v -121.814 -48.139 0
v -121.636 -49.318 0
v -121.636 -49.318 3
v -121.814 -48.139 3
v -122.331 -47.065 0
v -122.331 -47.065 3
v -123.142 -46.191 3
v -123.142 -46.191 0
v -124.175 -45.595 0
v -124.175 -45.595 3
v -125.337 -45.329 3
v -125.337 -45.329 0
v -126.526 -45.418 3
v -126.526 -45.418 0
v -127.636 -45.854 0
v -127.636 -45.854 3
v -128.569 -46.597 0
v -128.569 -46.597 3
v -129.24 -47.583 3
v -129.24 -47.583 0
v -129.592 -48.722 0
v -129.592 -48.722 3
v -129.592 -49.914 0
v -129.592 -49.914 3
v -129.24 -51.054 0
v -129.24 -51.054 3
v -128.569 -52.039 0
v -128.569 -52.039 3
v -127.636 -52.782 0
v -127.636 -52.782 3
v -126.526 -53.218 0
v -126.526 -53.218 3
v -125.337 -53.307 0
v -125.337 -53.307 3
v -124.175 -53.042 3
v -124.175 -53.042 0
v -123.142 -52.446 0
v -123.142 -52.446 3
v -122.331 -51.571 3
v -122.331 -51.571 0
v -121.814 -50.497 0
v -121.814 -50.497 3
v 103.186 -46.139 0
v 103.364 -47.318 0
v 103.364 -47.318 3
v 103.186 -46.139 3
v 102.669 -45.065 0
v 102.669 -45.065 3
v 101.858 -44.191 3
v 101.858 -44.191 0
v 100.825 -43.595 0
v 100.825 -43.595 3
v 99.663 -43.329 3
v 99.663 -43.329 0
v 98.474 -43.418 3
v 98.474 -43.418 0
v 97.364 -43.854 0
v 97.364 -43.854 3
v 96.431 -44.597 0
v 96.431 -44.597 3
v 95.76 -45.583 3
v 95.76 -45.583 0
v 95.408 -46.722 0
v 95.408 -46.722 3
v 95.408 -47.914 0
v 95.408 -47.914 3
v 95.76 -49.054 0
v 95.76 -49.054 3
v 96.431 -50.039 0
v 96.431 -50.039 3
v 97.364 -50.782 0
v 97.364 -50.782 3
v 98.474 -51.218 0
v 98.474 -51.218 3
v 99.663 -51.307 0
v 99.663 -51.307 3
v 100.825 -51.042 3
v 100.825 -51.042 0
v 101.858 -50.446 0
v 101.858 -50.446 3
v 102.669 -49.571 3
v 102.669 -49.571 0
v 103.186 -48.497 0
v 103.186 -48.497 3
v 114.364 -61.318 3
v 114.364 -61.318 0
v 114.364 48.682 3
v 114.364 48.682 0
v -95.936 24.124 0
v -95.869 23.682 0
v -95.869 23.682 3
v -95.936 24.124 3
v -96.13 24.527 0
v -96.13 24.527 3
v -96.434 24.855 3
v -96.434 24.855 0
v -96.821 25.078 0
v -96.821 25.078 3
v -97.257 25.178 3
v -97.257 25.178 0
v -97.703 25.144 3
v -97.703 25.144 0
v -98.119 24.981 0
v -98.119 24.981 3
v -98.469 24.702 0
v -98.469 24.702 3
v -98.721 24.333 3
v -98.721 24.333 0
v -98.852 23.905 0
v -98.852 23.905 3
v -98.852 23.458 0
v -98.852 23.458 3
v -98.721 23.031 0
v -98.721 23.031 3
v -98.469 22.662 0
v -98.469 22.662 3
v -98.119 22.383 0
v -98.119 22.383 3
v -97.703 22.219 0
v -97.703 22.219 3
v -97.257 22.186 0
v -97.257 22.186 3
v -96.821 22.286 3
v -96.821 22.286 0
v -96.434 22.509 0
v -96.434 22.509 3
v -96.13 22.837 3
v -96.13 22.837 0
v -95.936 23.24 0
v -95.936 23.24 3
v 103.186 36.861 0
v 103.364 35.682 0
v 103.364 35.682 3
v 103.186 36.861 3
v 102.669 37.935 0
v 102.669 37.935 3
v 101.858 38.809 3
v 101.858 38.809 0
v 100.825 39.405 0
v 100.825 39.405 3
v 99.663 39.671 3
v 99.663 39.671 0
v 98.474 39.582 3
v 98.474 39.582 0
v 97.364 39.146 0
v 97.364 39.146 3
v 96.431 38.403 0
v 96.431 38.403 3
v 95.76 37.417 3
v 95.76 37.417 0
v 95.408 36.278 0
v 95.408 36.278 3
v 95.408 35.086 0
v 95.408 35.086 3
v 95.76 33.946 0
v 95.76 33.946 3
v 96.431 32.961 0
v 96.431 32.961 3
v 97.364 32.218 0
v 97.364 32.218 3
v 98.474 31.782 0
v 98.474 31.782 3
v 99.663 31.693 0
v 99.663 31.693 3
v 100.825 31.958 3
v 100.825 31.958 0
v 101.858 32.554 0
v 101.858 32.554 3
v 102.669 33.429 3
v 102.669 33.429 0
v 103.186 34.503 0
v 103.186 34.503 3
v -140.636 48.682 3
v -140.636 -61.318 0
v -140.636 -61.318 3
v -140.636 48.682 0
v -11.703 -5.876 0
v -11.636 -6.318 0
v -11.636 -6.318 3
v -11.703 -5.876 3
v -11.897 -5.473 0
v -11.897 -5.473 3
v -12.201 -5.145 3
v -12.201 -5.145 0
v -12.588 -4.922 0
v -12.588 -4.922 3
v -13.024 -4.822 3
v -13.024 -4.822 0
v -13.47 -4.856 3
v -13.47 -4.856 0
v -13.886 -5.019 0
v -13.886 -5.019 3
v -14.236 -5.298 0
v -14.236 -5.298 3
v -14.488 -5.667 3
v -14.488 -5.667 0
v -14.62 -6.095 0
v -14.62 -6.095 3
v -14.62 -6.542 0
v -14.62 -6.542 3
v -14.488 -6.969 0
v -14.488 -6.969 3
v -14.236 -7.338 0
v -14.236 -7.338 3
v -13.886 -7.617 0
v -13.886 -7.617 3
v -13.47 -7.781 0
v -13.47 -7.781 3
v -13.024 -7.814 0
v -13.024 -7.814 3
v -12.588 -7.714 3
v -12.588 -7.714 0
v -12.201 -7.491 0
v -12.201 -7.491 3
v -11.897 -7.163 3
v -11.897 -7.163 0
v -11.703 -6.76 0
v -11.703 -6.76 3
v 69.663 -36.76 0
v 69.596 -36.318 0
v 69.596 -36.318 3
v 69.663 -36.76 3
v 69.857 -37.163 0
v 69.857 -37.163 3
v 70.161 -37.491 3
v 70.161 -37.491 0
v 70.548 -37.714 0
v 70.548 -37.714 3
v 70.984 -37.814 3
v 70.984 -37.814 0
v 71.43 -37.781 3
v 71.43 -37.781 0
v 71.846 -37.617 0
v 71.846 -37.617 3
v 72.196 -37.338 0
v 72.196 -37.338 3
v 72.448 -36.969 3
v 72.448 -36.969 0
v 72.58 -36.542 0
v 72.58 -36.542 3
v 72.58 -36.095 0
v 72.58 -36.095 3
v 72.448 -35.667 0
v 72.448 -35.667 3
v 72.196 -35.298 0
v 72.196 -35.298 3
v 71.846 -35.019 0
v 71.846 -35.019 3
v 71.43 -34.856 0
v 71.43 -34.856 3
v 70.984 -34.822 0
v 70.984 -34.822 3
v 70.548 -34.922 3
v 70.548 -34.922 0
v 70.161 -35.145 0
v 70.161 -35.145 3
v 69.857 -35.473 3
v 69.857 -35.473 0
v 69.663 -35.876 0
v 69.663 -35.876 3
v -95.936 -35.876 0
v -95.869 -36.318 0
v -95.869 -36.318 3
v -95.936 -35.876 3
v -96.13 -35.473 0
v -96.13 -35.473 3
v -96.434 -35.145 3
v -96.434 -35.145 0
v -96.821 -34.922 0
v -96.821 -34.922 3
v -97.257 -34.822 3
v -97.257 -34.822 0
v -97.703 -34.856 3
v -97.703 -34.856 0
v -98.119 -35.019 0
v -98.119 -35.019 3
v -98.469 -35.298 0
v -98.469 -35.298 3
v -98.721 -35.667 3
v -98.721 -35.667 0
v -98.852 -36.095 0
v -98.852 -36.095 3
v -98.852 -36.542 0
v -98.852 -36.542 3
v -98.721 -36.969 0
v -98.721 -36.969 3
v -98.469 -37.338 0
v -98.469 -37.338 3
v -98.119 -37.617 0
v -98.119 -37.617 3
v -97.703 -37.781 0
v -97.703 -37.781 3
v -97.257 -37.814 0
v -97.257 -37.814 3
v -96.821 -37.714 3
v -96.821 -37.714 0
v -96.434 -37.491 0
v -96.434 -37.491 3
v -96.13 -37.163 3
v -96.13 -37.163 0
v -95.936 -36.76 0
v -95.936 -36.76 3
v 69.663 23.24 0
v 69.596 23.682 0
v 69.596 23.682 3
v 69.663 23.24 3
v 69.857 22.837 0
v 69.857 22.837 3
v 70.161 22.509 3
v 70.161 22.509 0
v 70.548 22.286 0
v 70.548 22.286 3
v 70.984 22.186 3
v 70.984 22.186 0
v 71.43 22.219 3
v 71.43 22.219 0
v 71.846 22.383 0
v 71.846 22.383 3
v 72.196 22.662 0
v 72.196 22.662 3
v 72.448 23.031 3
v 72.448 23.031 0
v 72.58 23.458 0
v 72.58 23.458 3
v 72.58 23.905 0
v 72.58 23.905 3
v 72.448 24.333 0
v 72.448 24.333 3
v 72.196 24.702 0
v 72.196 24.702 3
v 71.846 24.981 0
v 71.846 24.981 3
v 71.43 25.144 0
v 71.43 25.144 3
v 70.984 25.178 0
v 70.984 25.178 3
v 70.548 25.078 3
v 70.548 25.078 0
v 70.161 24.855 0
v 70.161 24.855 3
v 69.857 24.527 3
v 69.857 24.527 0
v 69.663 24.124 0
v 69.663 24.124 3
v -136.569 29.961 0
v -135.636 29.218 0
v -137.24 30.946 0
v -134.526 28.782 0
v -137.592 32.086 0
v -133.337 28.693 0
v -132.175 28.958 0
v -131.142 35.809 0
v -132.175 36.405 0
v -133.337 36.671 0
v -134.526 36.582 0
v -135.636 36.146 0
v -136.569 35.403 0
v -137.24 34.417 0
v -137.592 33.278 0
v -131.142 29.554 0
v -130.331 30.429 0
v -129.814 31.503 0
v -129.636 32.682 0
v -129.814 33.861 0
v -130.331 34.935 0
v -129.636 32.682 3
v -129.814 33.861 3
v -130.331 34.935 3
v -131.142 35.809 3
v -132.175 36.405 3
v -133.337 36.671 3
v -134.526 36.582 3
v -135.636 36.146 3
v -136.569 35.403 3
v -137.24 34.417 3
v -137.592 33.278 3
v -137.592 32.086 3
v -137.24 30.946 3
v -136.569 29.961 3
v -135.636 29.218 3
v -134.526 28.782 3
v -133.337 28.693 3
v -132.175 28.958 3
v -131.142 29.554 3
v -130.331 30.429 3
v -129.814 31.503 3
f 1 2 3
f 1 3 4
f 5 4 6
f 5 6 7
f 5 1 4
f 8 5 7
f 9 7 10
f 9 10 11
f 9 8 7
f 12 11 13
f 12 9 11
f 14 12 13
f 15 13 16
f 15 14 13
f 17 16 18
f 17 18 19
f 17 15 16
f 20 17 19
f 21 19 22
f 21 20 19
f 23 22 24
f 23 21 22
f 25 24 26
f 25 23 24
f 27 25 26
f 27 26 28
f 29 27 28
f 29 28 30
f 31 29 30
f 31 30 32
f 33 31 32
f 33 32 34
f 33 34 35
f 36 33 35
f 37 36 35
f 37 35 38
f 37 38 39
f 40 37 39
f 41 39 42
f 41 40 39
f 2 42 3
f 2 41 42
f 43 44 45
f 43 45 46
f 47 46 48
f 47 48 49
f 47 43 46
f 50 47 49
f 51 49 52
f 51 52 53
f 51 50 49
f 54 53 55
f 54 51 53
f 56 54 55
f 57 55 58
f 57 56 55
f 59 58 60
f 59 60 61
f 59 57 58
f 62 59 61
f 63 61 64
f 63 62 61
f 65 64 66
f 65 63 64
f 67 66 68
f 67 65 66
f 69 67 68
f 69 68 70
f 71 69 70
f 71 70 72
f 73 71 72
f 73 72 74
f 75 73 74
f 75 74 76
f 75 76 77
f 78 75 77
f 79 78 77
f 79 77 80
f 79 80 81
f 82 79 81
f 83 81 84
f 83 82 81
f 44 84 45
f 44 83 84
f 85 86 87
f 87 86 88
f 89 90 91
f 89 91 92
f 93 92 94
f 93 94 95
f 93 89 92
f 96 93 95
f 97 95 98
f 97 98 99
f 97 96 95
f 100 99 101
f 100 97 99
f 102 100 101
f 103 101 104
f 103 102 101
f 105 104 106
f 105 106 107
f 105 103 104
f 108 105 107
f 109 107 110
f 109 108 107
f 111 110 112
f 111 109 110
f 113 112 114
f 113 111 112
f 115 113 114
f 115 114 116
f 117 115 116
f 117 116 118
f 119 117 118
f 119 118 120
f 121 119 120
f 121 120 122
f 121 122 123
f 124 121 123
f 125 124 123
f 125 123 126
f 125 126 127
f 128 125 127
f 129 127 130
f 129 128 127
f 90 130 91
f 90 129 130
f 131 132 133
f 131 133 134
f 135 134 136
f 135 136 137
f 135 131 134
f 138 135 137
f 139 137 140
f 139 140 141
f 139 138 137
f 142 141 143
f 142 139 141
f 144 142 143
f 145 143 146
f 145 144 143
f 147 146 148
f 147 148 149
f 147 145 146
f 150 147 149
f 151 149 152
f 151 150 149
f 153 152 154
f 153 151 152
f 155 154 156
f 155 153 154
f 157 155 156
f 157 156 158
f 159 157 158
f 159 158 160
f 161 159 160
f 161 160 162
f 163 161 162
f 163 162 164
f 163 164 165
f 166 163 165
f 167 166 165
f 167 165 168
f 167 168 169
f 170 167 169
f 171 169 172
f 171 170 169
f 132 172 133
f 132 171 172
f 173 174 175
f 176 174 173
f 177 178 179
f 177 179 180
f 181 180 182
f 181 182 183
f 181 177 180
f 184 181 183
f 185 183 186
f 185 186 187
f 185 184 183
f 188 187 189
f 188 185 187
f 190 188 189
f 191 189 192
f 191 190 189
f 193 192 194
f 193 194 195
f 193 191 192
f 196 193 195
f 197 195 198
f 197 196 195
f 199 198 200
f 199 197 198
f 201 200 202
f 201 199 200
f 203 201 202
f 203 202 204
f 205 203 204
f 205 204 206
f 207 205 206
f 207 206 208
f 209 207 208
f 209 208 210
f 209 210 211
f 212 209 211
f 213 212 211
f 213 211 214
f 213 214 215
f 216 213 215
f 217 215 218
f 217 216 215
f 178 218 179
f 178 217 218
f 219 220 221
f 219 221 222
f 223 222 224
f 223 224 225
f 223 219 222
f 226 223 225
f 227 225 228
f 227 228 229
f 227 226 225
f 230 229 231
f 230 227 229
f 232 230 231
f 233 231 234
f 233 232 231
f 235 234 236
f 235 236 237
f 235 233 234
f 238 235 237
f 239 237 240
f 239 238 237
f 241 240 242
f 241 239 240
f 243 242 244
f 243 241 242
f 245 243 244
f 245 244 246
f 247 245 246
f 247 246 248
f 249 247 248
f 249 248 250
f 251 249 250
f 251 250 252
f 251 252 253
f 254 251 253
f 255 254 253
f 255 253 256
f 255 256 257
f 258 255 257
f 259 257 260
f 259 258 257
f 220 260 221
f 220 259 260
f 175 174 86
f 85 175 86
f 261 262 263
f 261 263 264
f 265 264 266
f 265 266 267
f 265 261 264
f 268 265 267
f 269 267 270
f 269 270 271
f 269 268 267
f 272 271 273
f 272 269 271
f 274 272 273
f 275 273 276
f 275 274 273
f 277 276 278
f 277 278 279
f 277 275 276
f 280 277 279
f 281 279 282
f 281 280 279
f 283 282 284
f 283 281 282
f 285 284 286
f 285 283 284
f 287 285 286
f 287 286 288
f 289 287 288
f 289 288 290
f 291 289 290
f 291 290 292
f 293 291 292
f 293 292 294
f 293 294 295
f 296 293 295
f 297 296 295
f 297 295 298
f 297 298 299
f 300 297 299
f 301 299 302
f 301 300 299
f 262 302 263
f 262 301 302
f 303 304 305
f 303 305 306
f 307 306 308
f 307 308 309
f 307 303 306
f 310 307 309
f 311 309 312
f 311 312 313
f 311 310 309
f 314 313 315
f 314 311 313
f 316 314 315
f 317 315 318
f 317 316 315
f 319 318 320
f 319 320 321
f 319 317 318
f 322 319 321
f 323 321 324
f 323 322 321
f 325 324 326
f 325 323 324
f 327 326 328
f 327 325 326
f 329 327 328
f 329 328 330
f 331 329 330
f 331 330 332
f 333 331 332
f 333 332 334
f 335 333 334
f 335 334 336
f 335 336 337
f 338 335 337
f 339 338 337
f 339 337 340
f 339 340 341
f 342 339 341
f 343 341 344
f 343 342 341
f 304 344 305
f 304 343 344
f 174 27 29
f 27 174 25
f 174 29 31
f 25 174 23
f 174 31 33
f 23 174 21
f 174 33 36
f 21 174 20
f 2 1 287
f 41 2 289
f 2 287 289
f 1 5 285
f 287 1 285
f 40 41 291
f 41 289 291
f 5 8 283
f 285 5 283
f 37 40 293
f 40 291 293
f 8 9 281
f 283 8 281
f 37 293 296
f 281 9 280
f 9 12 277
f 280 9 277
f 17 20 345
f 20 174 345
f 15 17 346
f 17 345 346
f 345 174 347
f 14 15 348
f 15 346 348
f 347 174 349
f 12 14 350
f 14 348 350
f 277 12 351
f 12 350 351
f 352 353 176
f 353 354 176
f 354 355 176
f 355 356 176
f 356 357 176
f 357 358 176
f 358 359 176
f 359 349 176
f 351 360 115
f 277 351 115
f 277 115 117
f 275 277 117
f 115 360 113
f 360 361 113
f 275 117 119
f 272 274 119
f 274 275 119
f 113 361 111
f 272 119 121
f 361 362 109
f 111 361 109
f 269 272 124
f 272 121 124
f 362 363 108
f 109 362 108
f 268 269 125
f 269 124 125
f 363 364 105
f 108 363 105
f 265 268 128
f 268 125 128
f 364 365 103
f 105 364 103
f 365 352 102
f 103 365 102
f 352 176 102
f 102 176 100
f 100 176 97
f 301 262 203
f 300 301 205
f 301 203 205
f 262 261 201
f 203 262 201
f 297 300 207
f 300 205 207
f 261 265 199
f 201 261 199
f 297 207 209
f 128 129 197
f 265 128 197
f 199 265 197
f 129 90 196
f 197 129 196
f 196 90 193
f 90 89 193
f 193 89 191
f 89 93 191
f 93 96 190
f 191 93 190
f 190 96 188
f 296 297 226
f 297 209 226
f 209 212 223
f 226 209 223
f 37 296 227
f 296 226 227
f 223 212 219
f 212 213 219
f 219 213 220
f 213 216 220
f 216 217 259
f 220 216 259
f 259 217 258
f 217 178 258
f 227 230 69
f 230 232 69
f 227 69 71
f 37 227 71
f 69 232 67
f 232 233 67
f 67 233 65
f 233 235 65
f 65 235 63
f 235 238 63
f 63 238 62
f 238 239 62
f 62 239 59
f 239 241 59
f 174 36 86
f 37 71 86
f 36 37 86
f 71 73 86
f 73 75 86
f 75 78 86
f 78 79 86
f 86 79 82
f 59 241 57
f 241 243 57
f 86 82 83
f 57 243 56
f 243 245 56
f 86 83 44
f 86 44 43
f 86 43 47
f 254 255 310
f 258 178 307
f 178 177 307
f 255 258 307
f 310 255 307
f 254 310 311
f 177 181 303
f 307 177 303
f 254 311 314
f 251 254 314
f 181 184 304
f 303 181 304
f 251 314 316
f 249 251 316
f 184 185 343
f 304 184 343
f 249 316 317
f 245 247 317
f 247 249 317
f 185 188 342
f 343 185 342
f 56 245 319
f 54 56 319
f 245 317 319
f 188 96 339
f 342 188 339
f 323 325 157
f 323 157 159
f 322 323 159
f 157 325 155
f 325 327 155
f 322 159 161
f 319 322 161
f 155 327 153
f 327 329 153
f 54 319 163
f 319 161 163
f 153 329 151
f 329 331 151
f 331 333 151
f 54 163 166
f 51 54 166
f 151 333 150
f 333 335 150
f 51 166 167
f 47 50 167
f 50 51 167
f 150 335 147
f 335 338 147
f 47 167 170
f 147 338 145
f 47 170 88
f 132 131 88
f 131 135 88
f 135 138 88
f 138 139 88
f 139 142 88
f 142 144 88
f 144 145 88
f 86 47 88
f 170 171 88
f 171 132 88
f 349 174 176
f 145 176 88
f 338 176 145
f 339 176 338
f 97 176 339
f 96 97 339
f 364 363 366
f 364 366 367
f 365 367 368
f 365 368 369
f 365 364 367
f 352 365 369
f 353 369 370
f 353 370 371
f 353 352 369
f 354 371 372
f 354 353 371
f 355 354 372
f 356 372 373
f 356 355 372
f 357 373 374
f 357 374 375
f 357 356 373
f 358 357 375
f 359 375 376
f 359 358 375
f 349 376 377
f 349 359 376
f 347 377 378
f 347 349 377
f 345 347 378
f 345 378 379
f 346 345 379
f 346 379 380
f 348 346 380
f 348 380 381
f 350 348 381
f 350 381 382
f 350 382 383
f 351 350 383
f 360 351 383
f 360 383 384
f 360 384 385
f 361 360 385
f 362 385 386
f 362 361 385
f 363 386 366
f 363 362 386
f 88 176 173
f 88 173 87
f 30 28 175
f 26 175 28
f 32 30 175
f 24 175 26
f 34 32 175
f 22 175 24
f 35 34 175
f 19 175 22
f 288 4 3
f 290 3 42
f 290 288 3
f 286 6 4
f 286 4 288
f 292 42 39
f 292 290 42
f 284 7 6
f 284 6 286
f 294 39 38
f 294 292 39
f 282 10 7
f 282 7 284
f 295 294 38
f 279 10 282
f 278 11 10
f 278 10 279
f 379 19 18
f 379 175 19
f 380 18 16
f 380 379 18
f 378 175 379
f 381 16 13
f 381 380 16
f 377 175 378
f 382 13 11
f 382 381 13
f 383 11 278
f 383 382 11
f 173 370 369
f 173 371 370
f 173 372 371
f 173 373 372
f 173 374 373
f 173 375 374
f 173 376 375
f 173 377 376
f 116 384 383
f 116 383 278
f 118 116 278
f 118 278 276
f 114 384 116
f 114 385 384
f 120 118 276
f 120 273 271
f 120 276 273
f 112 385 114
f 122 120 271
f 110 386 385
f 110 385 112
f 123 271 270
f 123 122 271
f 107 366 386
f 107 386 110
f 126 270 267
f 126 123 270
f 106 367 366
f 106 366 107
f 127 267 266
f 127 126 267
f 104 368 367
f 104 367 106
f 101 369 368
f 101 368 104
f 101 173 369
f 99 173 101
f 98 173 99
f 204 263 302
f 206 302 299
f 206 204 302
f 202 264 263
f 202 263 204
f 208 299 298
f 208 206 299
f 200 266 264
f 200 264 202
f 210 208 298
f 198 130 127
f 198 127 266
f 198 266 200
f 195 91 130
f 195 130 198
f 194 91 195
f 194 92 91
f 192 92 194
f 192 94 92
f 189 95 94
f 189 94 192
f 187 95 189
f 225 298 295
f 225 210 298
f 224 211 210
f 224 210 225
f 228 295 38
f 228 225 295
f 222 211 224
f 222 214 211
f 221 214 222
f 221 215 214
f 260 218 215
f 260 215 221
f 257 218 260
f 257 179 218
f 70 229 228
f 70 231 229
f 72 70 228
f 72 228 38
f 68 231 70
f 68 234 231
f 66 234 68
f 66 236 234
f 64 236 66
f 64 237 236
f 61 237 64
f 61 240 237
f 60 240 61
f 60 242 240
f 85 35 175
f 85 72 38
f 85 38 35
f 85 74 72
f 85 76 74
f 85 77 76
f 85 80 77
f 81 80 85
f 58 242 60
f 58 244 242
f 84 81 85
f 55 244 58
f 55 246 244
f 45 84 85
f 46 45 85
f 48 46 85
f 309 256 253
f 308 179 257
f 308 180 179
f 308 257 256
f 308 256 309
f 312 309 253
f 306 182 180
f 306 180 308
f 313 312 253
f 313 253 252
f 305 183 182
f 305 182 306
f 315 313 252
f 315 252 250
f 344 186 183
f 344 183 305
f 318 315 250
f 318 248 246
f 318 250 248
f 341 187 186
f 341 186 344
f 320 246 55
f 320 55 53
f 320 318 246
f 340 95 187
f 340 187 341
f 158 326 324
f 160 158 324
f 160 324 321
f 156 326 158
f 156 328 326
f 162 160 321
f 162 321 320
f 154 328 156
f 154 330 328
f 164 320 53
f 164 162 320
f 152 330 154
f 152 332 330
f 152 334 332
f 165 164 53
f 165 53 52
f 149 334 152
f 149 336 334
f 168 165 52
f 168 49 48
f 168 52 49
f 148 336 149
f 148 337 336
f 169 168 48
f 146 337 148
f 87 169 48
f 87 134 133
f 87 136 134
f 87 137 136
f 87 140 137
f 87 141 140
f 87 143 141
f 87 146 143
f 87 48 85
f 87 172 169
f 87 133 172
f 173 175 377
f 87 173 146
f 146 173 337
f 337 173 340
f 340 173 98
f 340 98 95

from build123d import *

# Parameters (mm, degrees)
SKETCH1_W           = 255
SKETCH1_H           = 110
SKETCH1_R           = 4
SKETCH1_R_2         = 1.5
BOSS_EXTRUDE1_DEPTH = 3


with BuildPart() as part:
    # Sketch1 → Boss-Extrude1 (new body)
    with BuildSketch(Plane.XY):
        with Locations((-13.136363636, -6.318181818)):
            Rectangle(SKETCH1_W, SKETCH1_H)
        with Locations((-125.636363636, -49.318181818)):
            Circle(SKETCH1_R, mode=Mode.SUBTRACT)
        with Locations((-133.636363636, 32.681818182)):
            Circle(SKETCH1_R, mode=Mode.SUBTRACT)
        with Locations((99.363636364, -47.318181818)):
            Circle(SKETCH1_R, mode=Mode.SUBTRACT)
        with Locations((99.363636364, 35.681818182)):
            Circle(SKETCH1_R, mode=Mode.SUBTRACT)
        with Locations((-97.369202936, 23.681818182)):
            Circle(SKETCH1_R_2, mode=Mode.SUBTRACT)
        with Locations((-97.369202936, -36.318181818)):
            Circle(SKETCH1_R_2, mode=Mode.SUBTRACT)
        with Locations(Location((71.096475664, -36.318181818, 0), (0, 0, 180))):
            Circle(SKETCH1_R_2, mode=Mode.SUBTRACT)
        with Locations(Location((71.096475664, 23.681818182, 0), (0, 0, 180))):
            Circle(SKETCH1_R_2, mode=Mode.SUBTRACT)
        with Locations((-13.136363636, -6.318181818)):
            Circle(SKETCH1_R_2, mode=Mode.SUBTRACT)
    extrude(amount=BOSS_EXTRUDE1_DEPTH)


solid = part.part
